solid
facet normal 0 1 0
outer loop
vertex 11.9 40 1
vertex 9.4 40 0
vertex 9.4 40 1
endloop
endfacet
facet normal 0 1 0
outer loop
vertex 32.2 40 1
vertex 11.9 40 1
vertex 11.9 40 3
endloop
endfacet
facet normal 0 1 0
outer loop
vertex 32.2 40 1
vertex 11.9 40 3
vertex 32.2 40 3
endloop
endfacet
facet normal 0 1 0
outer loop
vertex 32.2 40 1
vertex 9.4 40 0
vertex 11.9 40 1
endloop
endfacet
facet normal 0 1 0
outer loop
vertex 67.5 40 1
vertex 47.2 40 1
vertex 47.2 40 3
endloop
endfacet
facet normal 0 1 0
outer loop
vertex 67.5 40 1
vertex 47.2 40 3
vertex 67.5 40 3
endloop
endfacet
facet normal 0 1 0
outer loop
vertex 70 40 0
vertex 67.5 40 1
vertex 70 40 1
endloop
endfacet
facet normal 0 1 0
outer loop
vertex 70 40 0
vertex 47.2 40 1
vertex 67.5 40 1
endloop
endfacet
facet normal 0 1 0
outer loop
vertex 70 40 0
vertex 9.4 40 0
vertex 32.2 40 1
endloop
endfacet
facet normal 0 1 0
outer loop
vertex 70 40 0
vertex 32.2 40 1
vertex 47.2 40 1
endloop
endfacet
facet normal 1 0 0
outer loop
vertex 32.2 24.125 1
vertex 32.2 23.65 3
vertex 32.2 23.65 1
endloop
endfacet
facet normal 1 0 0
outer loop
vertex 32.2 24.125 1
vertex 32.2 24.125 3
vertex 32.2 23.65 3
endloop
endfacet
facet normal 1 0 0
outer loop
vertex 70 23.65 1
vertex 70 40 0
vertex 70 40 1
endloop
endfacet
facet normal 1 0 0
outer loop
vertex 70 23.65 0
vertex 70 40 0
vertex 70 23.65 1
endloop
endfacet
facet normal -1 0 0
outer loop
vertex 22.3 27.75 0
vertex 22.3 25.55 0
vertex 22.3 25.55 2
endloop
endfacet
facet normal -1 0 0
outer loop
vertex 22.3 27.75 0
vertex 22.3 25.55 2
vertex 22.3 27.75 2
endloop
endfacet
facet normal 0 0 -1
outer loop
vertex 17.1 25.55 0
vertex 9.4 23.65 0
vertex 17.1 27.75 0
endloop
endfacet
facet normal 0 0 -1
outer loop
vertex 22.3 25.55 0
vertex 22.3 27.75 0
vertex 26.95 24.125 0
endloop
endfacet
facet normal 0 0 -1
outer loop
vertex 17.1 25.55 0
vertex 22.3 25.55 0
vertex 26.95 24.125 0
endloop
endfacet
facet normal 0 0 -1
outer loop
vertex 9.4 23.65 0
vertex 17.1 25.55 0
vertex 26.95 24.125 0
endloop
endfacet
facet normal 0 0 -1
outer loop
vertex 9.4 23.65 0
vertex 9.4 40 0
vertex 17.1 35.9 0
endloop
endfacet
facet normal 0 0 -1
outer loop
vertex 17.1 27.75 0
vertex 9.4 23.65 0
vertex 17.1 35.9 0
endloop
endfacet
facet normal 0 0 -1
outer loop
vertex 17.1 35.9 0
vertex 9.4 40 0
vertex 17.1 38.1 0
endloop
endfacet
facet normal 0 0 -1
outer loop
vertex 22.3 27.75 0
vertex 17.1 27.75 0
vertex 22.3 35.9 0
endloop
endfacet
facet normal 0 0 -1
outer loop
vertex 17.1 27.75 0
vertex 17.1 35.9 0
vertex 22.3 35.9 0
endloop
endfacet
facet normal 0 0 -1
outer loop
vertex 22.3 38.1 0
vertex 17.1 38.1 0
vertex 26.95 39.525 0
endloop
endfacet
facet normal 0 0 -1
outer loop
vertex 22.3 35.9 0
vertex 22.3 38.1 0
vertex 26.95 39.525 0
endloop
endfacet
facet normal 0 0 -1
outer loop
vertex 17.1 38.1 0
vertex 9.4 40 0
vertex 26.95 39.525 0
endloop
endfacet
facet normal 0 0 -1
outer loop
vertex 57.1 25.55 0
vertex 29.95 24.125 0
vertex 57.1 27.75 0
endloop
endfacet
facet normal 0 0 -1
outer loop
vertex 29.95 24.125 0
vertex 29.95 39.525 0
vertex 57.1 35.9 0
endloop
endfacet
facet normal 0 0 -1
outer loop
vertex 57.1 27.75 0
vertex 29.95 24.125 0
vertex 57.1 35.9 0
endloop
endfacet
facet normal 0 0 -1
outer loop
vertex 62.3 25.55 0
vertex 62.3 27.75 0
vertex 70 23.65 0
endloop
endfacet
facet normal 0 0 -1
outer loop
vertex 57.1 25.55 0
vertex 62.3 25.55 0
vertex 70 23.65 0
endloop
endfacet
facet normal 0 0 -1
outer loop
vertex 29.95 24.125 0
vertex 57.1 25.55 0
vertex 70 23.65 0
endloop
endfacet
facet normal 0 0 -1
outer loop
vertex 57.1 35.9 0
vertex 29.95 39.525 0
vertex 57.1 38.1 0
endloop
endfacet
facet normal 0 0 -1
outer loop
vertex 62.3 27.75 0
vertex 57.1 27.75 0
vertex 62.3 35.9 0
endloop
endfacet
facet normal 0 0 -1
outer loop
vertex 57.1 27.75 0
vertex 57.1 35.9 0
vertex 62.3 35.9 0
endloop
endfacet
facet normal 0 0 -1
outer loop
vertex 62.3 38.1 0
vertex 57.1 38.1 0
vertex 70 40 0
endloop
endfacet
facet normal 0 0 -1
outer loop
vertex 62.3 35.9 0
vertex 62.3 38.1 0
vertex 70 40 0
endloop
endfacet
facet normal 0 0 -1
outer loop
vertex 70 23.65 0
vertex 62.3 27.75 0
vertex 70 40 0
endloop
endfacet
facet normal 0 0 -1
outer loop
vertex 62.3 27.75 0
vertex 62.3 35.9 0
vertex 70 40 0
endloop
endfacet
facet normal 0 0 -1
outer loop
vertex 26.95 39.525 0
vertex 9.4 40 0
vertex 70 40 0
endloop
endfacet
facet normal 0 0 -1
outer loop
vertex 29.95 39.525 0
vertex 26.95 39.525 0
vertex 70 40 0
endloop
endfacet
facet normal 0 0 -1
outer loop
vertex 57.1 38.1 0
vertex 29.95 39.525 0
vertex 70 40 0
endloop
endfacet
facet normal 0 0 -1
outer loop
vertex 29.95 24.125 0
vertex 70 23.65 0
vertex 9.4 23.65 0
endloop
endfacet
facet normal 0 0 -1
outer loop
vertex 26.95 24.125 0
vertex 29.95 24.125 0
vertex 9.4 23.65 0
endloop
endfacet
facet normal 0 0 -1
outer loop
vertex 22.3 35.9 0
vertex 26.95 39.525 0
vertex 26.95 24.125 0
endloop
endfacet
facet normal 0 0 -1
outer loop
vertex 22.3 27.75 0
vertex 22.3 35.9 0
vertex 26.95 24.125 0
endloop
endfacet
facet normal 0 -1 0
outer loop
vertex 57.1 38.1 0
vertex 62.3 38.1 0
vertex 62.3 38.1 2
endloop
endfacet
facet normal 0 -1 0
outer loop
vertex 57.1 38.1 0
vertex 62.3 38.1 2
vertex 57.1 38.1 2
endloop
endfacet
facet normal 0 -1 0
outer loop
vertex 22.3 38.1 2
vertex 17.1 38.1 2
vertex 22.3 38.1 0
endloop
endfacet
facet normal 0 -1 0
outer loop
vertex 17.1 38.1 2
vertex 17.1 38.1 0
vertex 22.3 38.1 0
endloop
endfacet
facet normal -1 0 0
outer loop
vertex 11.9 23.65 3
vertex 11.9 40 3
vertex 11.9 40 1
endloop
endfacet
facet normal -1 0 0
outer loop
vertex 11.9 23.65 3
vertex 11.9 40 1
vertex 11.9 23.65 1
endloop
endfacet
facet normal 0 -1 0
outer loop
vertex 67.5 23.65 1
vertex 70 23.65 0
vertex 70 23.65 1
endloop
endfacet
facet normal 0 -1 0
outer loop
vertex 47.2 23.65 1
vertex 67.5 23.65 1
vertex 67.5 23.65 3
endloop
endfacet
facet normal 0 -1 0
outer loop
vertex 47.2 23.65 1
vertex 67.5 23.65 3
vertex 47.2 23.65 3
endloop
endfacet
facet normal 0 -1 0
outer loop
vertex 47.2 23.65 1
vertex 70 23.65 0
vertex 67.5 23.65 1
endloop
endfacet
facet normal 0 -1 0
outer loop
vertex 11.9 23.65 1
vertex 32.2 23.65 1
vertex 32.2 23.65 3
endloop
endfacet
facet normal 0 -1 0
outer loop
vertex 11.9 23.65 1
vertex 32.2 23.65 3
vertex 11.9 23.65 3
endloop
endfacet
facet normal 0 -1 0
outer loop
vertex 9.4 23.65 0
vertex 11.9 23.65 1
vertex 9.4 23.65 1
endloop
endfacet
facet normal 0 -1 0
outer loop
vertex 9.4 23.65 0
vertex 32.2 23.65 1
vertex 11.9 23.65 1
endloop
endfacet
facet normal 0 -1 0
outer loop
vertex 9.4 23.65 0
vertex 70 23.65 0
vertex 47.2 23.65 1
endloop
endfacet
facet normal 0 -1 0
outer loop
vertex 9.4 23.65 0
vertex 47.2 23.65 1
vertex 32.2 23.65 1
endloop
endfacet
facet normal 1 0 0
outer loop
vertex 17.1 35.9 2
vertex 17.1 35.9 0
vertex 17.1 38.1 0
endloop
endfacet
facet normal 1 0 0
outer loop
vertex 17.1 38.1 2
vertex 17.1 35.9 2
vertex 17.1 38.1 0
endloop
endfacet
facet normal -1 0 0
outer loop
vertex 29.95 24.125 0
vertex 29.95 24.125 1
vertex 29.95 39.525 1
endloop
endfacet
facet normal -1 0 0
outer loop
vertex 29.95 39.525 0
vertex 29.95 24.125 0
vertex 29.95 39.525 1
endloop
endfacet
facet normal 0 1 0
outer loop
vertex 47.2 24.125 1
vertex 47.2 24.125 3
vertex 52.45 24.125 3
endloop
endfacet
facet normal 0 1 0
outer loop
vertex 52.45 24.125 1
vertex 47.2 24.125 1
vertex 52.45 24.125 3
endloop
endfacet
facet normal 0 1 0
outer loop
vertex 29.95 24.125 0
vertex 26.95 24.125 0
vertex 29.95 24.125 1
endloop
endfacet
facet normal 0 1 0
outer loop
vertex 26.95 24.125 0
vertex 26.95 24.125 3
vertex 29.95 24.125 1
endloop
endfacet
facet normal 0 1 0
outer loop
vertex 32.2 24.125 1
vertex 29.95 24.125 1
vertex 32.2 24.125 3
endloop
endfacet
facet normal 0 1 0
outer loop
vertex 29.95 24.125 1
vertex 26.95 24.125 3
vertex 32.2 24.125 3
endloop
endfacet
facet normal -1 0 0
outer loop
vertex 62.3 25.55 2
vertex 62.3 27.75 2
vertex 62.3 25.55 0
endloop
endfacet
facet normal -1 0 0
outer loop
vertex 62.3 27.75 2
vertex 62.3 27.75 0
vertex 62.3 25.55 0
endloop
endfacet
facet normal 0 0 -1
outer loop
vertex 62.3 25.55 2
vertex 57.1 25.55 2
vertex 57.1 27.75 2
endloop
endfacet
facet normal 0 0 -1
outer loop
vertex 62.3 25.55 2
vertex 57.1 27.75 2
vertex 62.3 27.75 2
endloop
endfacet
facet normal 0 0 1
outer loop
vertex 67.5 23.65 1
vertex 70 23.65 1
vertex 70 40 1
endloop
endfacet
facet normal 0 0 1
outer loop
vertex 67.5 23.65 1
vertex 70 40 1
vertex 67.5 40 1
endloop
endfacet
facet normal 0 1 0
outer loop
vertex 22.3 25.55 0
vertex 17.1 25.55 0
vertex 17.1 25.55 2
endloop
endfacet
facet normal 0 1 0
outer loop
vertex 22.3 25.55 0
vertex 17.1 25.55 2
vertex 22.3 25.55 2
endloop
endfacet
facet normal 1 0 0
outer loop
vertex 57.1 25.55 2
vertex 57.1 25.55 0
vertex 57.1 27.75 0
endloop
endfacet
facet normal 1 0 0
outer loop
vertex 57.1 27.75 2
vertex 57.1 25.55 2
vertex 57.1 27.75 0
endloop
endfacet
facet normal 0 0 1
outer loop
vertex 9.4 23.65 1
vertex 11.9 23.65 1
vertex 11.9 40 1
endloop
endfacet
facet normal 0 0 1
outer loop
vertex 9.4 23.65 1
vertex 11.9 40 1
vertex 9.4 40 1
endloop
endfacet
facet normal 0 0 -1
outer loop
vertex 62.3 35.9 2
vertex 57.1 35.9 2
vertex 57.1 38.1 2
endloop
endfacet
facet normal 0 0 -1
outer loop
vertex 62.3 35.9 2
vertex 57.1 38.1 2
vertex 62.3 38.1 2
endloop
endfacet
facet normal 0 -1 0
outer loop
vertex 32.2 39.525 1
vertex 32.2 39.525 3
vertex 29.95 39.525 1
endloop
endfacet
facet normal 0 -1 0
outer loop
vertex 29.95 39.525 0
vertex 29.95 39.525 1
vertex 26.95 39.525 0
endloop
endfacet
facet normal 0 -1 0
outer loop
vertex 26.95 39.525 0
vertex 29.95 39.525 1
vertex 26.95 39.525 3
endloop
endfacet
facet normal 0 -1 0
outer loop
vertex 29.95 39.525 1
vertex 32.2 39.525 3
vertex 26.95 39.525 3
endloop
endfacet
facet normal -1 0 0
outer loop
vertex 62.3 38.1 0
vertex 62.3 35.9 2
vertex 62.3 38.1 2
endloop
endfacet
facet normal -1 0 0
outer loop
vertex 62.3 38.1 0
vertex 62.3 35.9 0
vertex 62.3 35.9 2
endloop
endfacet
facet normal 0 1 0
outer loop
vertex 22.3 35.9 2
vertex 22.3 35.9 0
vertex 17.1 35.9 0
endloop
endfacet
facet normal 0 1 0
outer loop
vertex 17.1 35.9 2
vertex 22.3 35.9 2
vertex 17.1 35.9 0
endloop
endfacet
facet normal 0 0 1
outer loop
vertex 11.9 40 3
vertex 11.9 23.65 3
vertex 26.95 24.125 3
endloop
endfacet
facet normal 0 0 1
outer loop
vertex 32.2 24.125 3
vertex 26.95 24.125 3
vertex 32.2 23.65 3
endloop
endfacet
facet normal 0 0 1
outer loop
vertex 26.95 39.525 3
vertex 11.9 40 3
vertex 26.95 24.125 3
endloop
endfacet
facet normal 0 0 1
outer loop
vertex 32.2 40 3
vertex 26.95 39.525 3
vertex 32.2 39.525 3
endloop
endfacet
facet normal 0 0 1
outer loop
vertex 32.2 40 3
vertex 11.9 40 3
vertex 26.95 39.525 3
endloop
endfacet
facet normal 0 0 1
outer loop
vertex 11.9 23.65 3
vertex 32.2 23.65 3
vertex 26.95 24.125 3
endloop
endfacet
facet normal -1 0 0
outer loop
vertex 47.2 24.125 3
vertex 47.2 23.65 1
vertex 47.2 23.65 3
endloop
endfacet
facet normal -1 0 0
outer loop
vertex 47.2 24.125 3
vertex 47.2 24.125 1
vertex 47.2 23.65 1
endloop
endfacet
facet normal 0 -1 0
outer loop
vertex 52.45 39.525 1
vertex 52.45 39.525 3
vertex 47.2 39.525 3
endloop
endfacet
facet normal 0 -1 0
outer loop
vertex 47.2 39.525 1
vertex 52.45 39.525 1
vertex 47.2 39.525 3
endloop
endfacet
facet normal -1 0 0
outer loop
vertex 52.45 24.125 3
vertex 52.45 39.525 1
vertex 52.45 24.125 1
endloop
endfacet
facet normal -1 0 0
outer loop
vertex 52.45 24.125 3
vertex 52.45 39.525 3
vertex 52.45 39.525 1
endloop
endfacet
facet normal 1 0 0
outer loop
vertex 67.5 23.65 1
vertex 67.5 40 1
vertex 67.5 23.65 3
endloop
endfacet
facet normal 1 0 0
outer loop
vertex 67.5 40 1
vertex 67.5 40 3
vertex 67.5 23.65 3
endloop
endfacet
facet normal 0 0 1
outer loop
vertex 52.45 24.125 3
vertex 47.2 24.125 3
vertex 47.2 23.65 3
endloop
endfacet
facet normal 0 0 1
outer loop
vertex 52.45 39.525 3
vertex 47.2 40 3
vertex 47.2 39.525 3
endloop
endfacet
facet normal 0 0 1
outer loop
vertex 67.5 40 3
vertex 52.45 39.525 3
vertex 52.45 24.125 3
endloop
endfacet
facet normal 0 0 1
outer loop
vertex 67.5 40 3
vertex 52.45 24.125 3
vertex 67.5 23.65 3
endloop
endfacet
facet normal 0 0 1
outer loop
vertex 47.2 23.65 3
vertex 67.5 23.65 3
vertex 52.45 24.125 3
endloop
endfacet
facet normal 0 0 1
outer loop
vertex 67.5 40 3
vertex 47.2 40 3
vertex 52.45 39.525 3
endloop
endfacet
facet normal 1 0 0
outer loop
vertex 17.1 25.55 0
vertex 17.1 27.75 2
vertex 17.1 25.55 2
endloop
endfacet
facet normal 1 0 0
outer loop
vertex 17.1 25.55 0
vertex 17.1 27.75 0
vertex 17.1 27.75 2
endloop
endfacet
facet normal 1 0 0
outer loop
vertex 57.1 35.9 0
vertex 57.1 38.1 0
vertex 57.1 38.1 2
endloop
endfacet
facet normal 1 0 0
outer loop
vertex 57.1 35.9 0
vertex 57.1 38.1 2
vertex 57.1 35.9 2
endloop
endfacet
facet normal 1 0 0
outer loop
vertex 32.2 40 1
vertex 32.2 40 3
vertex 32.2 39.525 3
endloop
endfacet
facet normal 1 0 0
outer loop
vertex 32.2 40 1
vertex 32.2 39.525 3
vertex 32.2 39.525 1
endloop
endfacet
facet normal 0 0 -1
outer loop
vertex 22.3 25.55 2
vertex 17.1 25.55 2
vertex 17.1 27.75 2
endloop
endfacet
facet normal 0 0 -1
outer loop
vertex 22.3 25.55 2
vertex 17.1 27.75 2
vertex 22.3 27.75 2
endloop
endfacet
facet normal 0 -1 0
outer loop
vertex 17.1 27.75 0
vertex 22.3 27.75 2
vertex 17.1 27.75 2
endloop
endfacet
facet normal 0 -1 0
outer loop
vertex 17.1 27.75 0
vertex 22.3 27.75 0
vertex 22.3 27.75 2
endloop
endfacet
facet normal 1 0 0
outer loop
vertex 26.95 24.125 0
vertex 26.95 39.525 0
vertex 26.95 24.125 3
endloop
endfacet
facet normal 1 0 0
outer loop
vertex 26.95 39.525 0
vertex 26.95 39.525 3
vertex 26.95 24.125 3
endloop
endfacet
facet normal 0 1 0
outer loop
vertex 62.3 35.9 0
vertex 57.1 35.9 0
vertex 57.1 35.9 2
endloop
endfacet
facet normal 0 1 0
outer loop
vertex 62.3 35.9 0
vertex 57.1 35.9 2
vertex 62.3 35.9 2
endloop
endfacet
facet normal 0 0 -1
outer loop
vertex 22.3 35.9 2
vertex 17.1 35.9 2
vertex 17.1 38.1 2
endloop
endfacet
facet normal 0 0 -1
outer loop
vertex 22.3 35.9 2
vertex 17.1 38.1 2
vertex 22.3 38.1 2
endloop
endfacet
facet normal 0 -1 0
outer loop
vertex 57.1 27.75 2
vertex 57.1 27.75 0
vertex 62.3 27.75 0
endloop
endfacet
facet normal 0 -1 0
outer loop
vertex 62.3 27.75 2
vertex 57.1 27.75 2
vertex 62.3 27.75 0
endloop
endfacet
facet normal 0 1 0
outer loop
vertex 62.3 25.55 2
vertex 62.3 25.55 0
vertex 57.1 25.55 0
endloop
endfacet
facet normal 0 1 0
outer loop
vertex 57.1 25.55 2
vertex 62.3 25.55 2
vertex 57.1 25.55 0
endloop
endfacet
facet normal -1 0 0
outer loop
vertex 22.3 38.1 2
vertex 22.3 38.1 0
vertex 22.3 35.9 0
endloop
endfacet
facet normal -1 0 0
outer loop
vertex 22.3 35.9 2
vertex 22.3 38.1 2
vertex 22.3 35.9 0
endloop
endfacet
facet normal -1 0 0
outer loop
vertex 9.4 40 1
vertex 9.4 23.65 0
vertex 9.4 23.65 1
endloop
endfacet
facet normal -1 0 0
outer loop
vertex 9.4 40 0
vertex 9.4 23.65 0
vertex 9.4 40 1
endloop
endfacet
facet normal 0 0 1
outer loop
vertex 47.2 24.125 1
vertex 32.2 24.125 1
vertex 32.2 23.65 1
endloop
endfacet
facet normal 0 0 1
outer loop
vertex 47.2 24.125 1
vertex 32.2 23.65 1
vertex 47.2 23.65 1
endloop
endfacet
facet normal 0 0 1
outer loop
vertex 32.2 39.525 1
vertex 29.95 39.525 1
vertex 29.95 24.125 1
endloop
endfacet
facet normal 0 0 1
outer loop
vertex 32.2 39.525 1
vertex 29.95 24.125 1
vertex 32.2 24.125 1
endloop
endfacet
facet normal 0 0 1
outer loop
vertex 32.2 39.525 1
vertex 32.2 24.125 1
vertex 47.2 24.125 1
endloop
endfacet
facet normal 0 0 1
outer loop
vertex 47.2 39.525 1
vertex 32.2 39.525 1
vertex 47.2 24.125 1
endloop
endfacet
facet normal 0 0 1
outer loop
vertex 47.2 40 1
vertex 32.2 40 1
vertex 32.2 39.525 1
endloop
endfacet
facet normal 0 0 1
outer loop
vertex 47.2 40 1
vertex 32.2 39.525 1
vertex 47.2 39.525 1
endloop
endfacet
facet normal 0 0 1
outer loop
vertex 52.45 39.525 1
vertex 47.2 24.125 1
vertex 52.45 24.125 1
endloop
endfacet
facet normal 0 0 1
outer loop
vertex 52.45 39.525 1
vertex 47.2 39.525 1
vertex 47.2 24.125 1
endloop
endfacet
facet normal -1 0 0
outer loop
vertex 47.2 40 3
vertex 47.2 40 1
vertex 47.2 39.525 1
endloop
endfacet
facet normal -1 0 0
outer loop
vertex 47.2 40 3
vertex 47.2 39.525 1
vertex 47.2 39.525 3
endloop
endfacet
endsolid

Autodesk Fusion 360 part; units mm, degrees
sketch "Esquisse1" plane through (0, 0, 0) normal (0, 0, 1) x (1, 0, 0)
  line L0 (9.4, 40) -> (70, 40)
  line L1 (70, 40) -> (70, 23.65)
  line L2 (70, 23.65) -> (9.4, 23.65)
  line L3 (9.4, 23.65) -> (9.4, 40)
  dimension "d1" = 60.6
  dimension "d2" = 16.35
extrude "Extrusion1" add sketch "Esquisse1" along normal blind 3
sketch "Esquisse2" plane through (0, 0, 0) normal (0, 0, -1) x (1, 0, 0)
  line L0 (70, -23.65) -> (9.4, -23.65)
  line L1 (9.4, -23.65) -> (9.4, -40)
  line L2 (9.4, -40) -> (70, -40)
  line L3 (70, -40) -> (70, -23.65)
  line L4 (17.1, -25.55) -> (22.3, -25.55)
  line L5 (22.3, -25.55) -> (22.3, -27.75)
  line L6 (22.3, -27.75) -> (17.1, -27.75)
  line L7 (17.1, -27.75) -> (17.1, -25.55)
  line L8 (19.7, -25.55) -> (19.7, -27.75) construction
  line L9 (39.7, -23.65) -> (39.7, -40) construction
  line L10 (57.1, -25.55) -> (57.1, -27.75)
  line L11 (62.3, -25.55) -> (57.1, -25.55)
  line L12 (62.3, -27.75) -> (62.3, -25.55)
  line L13 (57.1, -27.75) -> (62.3, -27.75)
  line L14 (9.4, -31.825) -> (70, -31.825) construction
  line L15 (17.1, -38.1) -> (22.3, -38.1)
  line L16 (22.3, -38.1) -> (22.3, -35.9)
  line L17 (22.3, -35.9) -> (17.1, -35.9)
  line L18 (17.1, -35.9) -> (17.1, -38.1)
  line L19 (62.3, -38.1) -> (57.1, -38.1)
  line L20 (62.3, -35.9) -> (62.3, -38.1)
  line L21 (57.1, -35.9) -> (62.3, -35.9)
  line L22 (57.1, -38.1) -> (57.1, -35.9)
  dimension "d5" = 20
  dimension "d12" = 5.2
  dimension "d13" = 2.2
  dimension "d14" = 1.9
extrude "Extrusion2" cut sketch "Esquisse2" against normal blind 2 contours L4 L5 L6 L7 | L10 L11 L12 L13 | L15 L16 L17 L18 | L19 L20 L21 L22
sketch "Esquisse3" plane through (0, 0, 3) normal (0, 0, 1) x (-1, 0, 0)
  line L0 (-9.4, -23.65) -> (-70, -23.65)
  line L1 (-70, -23.65) -> (-70, -40)
  line L2 (-70, -40) -> (-9.4, -40)
  line L3 (-9.4, -40) -> (-9.4, -23.65)
  line L4 (-26.95, -39.525) -> (-52.45, -39.525)
  line L5 (-52.45, -39.525) -> (-52.45, -24.125)
  line L6 (-52.45, -24.125) -> (-26.95, -24.125)
  line L7 (-26.95, -24.125) -> (-26.95, -39.525)
  line L8 (-9.4, -31.825) -> (-70, -31.825) construction
  line L9 (-39.7, -40) -> (-39.7, -23.65) construction
  dimension "d8" = 25.5
  dimension "d9" = 15.4
extrude "Extrusion3" cut sketch "Esquisse3" against normal blind 2 contours L4 L5 L6 L7
sketch "Esquisse4" plane through (0, 0, 1) normal (0, 0, 1) x (-1, 0, 0)
  line L0 (-26.95, -24.125) -> (-52.45, -24.125)
  line L1 (-52.45, -24.125) -> (-52.45, -39.525)
  line L2 (-52.45, -39.525) -> (-26.95, -39.525)
  line L3 (-26.95, -39.525) -> (-26.95, -24.125)
  line L4 (-26.95, -24.125) -> (-29.95, -24.125)
  line L5 (-29.95, -24.125) -> (-29.95, -39.525)
  line L6 (-29.95, -39.525) -> (-26.95, -39.525)
  line L7 (-26.95, -39.525) -> (-26.95, -24.125)
  dimension "d15" = 3
extrude "Extrusion4" cut sketch "Esquisse4" against normal blind 3 contours L0 L2 L3 L4 L5 L6 L7
sketch "Esquisse5" plane through (0, 40, 0) normal (0, 1, 0) x (-1, 0, 0)
  line L0 (-70, 0) -> (-9.4, 0)
  line L1 (-9.4, 0) -> (-9.4, 3)
  line L2 (-9.4, 3) -> (-70, 3)
  line L3 (-70, 3) -> (-70, 0)
  line L4 (-39.7, 3) -> (-39.7, 0) construction
  line L5 (-47.2, 3) -> (-32.2, 3)
  line L6 (-32.2, 3) -> (-32.2, 1)
  line L7 (-32.2, 1) -> (-47.2, 1)
  line L8 (-47.2, 1) -> (-47.2, 3)
  dimension "d18" = 15
  dimension "d19" = 2
extrude "Extrusion5" cut sketch "Esquisse5" against normal blind 21 contours L2 L5 L6 L7 L8
sketch "Esquisse6" plane through (0, 0, 3) normal (0, 0, 1) x (-1, 0, 0)
  line L0 (-47.2, -24.125) -> (-47.2, -23.65)
  line L1 (-47.2, -23.65) -> (-70, -23.65)
  line L2 (-70, -23.65) -> (-70, -40)
  line L3 (-70, -40) -> (-47.2, -40)
  line L4 (-47.2, -40) -> (-47.2, -39.525)
  line L5 (-47.2, -39.525) -> (-52.45, -39.525)
  line L6 (-52.45, -39.525) -> (-52.45, -24.125)
  line L7 (-52.45, -24.125) -> (-47.2, -24.125)
  line L8 (-70, -40) -> (-67.5, -40)
  line L9 (-67.5, -40) -> (-67.5, -23.65)
  line L10 (-67.5, -23.65) -> (-70, -23.65)
  line L11 (-70, -23.65) -> (-70, -40)
  line L12 (-39.7, -39) -> (-39.7, -18) construction
  line L13 (-9.4, -23.65) -> (-9.4, -40)
  line L14 (-11.9, -23.65) -> (-9.4, -23.65)
  line L15 (-11.9, -40) -> (-11.9, -23.65)
  line L16 (-9.4, -40) -> (-11.9, -40)
  dimension "d22" = 2.5
  dimension "d23" = 30.3
extrude "Extrusion6" cut sketch "Esquisse6" against normal blind 2 contours L1 L2 L3 L8 L9 L10 L11 | L13 L14 L15 L16
